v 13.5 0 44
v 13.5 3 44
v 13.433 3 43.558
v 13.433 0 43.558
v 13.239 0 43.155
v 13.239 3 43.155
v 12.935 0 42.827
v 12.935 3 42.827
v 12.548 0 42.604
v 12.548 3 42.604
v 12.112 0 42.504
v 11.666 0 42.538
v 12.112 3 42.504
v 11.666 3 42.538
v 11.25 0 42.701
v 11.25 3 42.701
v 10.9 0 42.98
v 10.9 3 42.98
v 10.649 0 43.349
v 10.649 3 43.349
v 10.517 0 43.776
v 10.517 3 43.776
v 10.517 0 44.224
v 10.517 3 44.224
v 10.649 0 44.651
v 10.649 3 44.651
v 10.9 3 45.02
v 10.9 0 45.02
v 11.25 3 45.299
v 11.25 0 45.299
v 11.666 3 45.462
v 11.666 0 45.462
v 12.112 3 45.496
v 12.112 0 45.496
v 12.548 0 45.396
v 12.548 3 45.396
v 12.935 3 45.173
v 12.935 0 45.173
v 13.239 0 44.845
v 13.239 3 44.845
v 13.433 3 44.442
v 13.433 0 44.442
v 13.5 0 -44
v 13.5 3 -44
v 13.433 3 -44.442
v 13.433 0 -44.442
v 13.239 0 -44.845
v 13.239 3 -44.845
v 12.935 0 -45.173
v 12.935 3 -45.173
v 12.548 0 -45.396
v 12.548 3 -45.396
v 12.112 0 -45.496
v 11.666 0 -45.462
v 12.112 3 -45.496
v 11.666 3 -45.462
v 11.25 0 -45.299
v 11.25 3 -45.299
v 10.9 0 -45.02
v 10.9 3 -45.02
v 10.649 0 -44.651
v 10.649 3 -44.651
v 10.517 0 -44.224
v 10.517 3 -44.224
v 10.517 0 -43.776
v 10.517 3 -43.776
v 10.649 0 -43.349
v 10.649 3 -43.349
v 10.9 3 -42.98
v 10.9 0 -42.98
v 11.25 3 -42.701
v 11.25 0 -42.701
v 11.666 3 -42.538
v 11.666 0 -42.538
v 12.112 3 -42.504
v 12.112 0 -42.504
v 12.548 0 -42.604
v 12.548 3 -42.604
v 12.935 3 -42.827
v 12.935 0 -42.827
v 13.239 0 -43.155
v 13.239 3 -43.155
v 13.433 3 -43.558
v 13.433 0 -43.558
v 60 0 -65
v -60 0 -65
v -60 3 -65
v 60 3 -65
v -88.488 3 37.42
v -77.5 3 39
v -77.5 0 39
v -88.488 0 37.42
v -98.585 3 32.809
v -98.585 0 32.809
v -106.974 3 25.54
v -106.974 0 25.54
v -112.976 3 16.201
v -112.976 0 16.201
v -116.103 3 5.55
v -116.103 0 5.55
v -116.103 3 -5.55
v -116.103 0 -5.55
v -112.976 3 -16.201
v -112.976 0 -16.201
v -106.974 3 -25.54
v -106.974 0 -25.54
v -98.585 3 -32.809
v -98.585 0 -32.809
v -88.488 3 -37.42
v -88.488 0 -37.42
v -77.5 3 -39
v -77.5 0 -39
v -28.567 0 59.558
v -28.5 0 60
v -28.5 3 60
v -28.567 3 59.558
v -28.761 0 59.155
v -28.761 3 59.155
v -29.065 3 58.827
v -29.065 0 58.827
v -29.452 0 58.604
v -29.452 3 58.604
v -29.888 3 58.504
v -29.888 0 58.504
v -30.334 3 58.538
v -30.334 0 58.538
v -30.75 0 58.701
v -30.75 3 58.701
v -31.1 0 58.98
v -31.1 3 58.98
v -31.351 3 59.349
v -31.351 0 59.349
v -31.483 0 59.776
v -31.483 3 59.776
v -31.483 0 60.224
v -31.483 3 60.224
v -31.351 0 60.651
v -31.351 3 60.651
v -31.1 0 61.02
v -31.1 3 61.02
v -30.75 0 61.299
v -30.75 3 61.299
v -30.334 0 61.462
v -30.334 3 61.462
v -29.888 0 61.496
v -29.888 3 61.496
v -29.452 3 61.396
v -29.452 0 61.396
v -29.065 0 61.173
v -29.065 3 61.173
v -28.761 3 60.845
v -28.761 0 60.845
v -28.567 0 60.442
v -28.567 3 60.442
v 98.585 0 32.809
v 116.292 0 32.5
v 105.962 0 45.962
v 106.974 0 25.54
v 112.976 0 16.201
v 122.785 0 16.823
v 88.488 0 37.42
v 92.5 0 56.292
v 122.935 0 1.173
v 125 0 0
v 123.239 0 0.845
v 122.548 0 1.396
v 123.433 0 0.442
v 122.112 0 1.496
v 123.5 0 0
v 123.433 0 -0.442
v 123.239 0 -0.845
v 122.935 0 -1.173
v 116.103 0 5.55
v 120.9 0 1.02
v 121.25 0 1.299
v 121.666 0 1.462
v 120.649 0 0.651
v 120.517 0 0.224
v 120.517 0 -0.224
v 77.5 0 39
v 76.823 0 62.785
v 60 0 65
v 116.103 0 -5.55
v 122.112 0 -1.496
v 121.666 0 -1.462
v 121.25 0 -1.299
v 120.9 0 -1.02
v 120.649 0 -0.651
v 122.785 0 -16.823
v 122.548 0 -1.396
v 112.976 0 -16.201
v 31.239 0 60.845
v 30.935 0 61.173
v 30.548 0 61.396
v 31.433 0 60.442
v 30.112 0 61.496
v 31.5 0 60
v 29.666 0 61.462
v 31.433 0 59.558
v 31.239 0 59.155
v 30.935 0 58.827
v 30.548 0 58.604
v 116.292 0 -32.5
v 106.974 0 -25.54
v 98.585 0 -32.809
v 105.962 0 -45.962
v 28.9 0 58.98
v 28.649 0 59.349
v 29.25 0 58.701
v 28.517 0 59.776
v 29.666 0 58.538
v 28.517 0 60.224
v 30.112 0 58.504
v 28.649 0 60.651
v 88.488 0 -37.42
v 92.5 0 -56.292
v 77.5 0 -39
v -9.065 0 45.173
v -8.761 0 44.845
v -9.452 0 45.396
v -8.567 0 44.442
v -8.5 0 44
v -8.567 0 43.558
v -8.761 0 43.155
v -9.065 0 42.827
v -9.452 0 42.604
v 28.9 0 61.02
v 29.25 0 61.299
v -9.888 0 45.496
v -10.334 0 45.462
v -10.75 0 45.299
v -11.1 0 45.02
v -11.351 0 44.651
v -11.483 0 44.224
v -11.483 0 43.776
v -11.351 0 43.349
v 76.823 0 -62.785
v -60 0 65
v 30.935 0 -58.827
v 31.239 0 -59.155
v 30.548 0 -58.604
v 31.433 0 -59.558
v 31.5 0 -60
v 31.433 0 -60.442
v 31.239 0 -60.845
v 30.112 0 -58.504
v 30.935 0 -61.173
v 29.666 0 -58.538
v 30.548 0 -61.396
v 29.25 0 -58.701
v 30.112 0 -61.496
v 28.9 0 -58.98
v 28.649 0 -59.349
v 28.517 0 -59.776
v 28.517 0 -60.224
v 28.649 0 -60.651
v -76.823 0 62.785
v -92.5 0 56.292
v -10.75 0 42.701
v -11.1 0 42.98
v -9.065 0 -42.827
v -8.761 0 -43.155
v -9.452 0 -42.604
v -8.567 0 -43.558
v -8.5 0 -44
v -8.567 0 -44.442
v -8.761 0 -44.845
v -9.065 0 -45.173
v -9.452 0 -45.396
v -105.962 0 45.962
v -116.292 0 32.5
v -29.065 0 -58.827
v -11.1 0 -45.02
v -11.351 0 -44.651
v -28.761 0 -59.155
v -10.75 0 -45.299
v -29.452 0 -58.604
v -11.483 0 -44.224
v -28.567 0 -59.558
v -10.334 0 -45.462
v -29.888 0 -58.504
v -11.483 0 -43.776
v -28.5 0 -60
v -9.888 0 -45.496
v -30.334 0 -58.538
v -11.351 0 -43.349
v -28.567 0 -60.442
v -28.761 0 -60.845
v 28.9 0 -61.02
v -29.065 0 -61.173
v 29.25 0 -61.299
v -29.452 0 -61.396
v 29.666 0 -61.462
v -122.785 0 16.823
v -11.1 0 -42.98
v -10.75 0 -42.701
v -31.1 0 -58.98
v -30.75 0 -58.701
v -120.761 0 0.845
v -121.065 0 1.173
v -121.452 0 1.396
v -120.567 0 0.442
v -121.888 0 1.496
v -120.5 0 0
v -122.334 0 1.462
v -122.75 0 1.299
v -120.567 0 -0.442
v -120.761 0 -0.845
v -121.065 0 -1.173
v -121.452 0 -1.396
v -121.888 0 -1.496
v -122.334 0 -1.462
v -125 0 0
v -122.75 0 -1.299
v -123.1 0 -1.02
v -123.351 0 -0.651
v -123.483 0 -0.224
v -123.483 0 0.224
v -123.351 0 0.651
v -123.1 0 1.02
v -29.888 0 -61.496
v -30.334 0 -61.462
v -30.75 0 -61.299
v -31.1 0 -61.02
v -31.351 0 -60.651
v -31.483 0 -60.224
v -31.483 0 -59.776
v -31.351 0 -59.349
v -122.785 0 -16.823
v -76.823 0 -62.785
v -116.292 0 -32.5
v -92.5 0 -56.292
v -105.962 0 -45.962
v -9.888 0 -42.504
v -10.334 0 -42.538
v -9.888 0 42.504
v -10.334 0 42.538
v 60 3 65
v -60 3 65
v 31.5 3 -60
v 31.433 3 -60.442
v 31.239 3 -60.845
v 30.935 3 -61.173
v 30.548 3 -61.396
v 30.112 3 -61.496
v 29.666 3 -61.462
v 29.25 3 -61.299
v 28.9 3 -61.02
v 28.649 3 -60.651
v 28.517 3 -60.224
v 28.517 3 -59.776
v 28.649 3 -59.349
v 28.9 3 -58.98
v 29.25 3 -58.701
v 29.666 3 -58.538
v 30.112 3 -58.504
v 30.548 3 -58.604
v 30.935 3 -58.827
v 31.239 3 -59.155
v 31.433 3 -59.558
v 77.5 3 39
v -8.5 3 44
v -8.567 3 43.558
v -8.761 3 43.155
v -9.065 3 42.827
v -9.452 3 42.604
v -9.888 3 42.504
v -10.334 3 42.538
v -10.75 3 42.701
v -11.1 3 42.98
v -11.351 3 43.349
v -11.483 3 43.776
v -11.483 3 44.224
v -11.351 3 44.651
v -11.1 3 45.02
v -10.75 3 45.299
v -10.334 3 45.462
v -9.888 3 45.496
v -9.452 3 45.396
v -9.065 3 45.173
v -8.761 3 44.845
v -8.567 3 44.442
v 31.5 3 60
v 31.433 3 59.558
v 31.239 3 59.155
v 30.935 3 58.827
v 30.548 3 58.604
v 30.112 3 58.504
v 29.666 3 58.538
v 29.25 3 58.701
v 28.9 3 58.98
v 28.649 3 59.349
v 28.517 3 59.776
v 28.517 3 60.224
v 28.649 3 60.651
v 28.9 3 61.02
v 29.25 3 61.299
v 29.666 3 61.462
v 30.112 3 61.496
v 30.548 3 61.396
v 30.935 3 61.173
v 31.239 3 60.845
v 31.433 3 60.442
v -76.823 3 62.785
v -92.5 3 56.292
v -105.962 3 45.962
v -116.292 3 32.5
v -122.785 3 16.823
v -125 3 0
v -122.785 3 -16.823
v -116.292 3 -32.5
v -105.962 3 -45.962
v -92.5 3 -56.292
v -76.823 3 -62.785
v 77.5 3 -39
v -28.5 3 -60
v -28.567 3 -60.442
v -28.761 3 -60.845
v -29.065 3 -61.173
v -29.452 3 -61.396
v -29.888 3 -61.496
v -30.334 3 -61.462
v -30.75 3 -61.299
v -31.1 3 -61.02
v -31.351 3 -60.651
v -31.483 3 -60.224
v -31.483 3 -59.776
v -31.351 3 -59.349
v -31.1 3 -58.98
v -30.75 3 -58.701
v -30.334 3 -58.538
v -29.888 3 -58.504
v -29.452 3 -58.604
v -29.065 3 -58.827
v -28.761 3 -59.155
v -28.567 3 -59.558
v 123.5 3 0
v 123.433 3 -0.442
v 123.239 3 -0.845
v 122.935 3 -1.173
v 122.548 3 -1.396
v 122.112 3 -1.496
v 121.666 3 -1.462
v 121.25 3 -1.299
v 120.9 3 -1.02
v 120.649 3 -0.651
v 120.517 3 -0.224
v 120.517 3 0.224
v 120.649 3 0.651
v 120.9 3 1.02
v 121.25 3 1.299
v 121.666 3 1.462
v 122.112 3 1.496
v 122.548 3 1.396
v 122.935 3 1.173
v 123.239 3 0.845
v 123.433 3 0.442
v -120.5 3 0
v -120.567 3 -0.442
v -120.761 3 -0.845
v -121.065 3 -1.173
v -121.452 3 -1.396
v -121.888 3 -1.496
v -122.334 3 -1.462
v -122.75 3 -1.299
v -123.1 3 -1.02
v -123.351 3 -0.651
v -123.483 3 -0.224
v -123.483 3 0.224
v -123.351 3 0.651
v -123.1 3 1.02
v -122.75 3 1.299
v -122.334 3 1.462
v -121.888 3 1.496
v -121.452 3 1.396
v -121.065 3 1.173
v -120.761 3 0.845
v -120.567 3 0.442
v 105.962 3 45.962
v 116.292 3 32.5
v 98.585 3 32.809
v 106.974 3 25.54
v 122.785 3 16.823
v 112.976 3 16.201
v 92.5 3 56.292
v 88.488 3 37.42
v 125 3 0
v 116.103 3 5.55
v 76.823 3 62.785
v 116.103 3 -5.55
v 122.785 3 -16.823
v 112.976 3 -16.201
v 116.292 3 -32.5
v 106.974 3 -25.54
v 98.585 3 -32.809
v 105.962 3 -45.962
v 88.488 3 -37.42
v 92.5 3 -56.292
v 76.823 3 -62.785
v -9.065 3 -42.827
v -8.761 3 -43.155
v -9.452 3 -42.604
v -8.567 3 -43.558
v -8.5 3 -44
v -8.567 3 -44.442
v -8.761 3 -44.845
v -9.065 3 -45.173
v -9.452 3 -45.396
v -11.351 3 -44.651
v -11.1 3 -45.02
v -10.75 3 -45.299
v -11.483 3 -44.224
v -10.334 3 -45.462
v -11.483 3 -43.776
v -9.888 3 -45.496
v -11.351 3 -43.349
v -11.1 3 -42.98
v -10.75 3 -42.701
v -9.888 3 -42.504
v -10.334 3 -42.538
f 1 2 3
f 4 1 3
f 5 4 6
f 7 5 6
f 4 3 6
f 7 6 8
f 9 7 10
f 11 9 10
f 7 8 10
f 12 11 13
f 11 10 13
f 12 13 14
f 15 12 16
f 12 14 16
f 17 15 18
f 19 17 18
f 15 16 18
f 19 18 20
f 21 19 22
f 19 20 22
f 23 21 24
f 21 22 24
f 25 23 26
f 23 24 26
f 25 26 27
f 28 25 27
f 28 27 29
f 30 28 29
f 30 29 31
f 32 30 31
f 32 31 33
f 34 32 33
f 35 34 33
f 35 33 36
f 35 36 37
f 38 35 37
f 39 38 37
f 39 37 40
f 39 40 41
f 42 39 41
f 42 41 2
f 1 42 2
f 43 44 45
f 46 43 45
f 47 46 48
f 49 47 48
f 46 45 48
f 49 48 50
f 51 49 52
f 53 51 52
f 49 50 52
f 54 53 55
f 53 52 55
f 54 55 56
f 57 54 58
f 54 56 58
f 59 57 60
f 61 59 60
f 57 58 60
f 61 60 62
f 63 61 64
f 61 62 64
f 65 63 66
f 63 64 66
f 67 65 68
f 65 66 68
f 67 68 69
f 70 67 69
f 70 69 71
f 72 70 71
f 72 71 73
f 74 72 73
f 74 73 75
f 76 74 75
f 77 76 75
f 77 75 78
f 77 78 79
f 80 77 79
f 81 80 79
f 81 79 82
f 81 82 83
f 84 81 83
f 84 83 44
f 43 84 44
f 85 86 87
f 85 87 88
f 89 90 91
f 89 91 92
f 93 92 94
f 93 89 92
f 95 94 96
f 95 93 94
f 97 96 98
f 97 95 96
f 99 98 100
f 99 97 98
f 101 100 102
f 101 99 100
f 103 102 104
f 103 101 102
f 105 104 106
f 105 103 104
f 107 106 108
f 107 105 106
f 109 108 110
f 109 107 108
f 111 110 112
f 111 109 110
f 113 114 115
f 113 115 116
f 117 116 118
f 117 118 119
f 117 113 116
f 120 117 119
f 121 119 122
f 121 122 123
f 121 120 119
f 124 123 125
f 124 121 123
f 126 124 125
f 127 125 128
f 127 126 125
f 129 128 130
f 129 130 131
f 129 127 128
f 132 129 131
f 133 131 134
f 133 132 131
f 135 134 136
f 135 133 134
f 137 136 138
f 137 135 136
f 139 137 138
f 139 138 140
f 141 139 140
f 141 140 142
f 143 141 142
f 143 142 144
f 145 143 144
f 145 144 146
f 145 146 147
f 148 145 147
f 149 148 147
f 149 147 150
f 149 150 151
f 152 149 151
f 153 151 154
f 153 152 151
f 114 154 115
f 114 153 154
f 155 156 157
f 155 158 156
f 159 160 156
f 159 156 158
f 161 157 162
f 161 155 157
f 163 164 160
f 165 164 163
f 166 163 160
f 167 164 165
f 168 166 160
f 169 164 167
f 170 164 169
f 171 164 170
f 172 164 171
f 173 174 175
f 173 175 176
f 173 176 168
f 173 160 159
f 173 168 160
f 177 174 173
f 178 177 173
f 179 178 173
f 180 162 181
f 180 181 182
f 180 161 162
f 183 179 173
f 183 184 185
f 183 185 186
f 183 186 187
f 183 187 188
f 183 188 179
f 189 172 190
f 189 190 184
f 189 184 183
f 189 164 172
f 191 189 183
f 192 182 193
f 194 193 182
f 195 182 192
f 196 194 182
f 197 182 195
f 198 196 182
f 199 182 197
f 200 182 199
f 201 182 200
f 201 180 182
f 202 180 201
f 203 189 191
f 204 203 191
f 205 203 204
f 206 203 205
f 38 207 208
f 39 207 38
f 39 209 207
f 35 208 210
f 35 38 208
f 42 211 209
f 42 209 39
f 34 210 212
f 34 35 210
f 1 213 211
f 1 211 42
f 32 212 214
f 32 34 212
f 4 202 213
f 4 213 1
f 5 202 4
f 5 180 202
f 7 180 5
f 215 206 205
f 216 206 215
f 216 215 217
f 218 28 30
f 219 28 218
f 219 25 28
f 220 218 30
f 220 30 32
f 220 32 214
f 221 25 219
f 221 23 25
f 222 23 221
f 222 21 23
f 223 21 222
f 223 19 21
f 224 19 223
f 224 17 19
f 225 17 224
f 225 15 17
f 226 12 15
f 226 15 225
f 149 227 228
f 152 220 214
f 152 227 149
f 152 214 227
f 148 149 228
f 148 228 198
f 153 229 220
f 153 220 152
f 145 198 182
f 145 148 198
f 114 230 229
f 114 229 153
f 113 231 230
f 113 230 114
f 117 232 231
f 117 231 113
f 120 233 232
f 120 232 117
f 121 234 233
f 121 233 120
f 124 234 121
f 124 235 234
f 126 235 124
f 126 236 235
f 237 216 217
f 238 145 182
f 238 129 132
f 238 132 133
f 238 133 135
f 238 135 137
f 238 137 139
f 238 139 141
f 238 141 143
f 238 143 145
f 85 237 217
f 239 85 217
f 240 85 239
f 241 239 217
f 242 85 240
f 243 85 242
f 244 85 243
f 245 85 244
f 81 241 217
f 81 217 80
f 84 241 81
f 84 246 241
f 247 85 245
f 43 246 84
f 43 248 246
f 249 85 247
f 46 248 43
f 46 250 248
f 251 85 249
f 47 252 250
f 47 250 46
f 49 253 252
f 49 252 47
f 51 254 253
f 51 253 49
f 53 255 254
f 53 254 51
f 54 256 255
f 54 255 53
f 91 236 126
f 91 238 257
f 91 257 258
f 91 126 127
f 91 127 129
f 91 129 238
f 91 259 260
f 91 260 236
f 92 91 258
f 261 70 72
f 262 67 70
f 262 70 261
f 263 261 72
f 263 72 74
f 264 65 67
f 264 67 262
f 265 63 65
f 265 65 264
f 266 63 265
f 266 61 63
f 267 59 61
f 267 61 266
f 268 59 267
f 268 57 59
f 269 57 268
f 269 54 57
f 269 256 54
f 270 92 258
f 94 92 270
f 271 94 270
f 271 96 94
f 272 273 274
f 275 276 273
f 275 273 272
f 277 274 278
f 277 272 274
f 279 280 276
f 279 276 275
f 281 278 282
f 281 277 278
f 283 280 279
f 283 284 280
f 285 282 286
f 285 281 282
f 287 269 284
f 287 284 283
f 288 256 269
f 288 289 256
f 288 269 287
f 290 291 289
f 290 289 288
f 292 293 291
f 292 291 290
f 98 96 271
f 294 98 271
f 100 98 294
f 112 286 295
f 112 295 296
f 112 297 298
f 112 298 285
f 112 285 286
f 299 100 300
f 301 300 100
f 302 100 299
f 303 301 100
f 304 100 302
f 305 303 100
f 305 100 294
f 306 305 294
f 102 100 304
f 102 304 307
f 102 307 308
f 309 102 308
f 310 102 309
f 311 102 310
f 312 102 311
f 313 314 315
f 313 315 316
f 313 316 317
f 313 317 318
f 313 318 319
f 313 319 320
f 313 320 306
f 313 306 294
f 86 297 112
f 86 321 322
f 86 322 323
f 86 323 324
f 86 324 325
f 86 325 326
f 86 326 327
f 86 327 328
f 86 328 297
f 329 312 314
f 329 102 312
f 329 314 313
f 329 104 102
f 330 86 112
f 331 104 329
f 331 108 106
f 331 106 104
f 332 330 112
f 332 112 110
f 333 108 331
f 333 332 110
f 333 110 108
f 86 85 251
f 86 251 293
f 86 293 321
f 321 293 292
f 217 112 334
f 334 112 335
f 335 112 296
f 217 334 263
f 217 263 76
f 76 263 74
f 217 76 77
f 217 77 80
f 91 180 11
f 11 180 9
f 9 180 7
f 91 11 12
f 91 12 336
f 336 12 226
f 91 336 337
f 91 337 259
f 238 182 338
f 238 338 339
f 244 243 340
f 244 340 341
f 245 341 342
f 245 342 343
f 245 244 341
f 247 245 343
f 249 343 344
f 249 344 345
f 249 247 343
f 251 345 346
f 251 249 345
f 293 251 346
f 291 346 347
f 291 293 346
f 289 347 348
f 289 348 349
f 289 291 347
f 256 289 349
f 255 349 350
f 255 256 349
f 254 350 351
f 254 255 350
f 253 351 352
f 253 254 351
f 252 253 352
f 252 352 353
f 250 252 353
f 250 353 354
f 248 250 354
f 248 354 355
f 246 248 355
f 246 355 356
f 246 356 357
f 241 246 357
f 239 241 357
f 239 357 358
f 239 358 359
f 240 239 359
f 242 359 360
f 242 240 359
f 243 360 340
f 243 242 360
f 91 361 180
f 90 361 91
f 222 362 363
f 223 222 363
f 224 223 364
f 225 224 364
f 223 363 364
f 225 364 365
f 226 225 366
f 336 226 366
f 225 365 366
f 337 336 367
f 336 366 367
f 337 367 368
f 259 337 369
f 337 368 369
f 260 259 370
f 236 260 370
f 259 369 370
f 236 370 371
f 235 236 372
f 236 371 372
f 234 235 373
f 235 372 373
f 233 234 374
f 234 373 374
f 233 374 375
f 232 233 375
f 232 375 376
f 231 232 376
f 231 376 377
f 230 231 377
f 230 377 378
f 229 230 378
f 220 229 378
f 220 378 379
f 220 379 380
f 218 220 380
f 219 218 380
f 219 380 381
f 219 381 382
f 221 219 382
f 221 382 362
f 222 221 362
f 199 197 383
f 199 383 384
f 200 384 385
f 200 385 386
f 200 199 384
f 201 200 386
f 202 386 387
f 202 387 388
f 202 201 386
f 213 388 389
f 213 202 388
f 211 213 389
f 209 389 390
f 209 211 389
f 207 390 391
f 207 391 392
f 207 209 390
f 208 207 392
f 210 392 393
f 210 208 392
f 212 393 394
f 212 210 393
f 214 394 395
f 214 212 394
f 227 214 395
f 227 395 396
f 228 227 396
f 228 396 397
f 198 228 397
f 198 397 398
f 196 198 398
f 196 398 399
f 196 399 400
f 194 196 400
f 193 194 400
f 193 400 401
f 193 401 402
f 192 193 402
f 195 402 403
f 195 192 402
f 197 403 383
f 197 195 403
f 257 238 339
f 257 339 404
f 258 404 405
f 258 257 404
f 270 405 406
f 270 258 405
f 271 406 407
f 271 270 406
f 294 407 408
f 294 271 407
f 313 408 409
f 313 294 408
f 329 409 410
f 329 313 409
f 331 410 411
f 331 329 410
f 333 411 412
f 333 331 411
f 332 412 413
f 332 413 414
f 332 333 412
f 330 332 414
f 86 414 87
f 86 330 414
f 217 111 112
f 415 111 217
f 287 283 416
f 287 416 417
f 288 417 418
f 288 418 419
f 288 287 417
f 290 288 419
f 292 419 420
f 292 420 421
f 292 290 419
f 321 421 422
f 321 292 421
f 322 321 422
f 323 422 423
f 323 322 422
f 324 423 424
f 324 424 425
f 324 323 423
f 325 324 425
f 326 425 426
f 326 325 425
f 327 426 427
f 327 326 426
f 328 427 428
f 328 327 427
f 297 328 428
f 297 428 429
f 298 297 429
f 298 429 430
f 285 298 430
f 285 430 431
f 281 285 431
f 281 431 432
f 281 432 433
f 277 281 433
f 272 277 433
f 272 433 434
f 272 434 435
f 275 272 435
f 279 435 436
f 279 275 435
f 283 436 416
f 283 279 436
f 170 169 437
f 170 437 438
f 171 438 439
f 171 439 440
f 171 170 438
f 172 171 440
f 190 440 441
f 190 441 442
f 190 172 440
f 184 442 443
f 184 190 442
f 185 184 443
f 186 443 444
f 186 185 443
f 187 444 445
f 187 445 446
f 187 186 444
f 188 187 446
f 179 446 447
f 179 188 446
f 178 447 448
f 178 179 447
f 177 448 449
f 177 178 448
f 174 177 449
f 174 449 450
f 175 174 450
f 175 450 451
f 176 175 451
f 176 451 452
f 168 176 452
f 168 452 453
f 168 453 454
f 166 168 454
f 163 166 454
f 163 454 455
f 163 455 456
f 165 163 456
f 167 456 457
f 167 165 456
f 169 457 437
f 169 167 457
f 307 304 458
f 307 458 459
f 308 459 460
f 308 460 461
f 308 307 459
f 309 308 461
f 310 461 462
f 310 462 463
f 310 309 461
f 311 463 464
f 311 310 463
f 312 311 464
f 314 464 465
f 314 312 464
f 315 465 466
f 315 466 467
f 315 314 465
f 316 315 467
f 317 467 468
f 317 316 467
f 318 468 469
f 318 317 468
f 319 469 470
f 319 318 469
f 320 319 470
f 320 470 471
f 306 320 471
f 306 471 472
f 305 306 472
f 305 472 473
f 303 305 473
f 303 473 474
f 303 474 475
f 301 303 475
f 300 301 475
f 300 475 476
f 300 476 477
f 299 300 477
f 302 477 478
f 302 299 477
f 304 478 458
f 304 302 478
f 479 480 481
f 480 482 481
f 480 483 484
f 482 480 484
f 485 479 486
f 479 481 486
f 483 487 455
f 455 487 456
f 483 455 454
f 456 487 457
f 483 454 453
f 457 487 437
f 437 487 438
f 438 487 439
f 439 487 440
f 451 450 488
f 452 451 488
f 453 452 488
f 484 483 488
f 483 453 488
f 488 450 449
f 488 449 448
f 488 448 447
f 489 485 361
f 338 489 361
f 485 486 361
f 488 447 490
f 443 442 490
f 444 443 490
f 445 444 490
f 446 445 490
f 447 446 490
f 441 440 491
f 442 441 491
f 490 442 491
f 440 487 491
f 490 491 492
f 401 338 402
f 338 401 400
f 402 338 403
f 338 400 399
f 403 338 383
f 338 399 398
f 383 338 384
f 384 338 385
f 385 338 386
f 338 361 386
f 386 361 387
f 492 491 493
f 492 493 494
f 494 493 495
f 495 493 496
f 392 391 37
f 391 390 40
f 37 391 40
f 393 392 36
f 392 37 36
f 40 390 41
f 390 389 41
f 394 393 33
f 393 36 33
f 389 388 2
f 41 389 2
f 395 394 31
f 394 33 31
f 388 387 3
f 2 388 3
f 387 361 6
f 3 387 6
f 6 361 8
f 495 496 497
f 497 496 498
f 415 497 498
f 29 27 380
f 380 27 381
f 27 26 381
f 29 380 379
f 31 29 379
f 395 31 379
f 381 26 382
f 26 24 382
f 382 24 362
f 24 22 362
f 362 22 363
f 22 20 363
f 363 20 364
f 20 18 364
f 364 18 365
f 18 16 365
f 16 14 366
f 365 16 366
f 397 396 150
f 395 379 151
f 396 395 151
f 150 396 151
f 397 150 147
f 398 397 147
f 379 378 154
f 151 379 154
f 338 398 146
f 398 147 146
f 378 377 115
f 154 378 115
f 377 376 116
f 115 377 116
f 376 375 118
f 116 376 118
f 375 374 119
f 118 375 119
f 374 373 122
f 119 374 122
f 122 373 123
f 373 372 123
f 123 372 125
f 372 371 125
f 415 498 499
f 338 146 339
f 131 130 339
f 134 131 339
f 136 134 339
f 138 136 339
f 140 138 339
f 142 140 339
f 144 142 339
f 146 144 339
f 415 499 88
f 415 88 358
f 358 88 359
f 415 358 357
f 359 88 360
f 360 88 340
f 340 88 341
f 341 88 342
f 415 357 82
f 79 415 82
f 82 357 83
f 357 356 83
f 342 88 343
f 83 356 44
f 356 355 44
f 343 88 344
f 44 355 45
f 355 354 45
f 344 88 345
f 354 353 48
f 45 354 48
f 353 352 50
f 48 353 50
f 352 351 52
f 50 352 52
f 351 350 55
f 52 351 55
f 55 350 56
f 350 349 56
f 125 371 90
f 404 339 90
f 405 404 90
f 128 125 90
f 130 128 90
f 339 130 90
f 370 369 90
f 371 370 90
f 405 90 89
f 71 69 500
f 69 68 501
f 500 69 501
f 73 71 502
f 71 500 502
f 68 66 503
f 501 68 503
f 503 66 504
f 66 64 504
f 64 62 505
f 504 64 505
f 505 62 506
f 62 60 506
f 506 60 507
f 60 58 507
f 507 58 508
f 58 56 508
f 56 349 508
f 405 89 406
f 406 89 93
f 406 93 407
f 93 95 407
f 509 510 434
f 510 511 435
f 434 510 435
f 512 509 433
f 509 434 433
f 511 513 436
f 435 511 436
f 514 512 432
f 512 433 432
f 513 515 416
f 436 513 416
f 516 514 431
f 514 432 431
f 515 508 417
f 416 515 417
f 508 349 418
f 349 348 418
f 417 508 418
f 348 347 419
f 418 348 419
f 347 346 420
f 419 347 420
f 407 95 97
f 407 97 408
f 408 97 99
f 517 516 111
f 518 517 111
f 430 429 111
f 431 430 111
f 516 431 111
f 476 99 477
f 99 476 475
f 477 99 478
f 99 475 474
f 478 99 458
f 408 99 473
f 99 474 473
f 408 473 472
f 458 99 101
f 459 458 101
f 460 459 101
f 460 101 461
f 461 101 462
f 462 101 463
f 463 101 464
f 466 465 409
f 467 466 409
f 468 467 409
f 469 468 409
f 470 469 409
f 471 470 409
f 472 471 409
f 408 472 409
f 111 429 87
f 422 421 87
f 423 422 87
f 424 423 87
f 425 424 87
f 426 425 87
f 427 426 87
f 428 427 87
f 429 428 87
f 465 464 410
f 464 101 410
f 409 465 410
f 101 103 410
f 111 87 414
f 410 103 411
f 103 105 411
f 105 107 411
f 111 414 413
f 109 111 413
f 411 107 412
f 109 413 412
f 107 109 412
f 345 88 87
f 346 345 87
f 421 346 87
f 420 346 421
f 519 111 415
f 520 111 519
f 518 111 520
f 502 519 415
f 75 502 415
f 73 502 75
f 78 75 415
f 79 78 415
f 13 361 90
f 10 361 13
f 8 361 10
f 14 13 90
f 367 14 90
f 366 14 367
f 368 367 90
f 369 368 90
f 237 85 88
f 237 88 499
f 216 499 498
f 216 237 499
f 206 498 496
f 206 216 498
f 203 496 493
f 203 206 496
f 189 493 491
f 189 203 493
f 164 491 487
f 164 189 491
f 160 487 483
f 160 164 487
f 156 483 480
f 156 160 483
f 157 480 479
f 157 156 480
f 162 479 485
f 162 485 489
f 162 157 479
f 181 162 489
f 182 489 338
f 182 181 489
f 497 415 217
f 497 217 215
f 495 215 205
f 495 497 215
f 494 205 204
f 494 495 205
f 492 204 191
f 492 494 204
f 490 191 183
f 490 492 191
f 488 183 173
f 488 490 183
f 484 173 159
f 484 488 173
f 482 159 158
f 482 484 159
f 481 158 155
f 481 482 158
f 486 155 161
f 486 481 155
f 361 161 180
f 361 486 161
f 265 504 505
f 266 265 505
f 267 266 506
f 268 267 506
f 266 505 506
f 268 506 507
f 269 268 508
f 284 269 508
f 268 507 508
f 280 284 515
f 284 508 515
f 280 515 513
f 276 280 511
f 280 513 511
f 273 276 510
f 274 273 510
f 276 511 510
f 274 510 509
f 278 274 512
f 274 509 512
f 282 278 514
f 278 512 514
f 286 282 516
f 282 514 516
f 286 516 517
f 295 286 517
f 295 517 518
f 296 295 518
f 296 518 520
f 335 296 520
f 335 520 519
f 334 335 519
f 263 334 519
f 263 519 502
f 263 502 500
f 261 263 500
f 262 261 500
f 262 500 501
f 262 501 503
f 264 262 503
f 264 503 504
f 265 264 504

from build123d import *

# Parameters (mm, degrees)
SKETCH_1_R          = 1.5
EXTRUDE_2_DEPTH     = 3
SKETCH_2_R          = 1.5
CUT_EXTRUDE_1_DEPTH = 10
CUT_EXTRUDE_2_DEPTH = 10


with BuildPart() as part:
    # 草图1 → 凸台-拉伸2 (new body)
    with BuildSketch(Plane(origin=(0, 0, 0), x_dir=(1, 0, 0), z_dir=(0, 1, 0))):
        with BuildLine():
            Line((-60, 65), (60, 65))
            ThreePointArc((60, 65), (125, 0), (60, -65))
            Line((60, -65), (-60, -65))
            ThreePointArc((-60, -65), (-125, 0), (-60, 65))
        make_face()
        with Locations((-122, 0)):
            Circle(SKETCH_1_R, mode=Mode.SUBTRACT)
        with Locations((122, 0)):
            Circle(SKETCH_1_R, mode=Mode.SUBTRACT)
        with Locations((-30, 60)):
            Circle(SKETCH_1_R, mode=Mode.SUBTRACT)
        with Locations((30, 60)):
            Circle(SKETCH_1_R, mode=Mode.SUBTRACT)
        with Locations((30, -60)):
            Circle(SKETCH_1_R, mode=Mode.SUBTRACT)
        with Locations((-30, -60)):
            Circle(SKETCH_1_R, mode=Mode.SUBTRACT)
    extrude(amount=EXTRUDE_2_DEPTH)

    # 草图2 → 切除-拉伸1 (cut)
    with BuildSketch(Plane(origin=(0, 3, 0), x_dir=(1, 0, 0), z_dir=(0, 1, 0))):
        with Locations((-10, 44)):
            Circle(SKETCH_2_R)
        with Locations((12, 44)):
            Circle(SKETCH_2_R)
        with Locations((-10, -44)):
            Circle(SKETCH_2_R)
        with Locations((12, -44)):
            Circle(SKETCH_2_R)
    extrude(amount=-CUT_EXTRUDE_1_DEPTH, mode=Mode.SUBTRACT)

    # 草图3 → 切除-拉伸2 (cut)
    with BuildSketch(Plane(origin=(0, 3, 0), x_dir=(1, 0, 0), z_dir=(0, 1, 0))):
        with BuildLine():
            Line((-77.5, 39), (77.5, 39))
            ThreePointArc((77.5, 39), (116.5, 0), (77.5, -39))
            Line((77.5, -39), (-77.5, -39))
            ThreePointArc((-77.5, -39), (-116.5, 0), (-77.5, 39))
        make_face()
    extrude(amount=-CUT_EXTRUDE_2_DEPTH, mode=Mode.SUBTRACT)


solid = part.part
